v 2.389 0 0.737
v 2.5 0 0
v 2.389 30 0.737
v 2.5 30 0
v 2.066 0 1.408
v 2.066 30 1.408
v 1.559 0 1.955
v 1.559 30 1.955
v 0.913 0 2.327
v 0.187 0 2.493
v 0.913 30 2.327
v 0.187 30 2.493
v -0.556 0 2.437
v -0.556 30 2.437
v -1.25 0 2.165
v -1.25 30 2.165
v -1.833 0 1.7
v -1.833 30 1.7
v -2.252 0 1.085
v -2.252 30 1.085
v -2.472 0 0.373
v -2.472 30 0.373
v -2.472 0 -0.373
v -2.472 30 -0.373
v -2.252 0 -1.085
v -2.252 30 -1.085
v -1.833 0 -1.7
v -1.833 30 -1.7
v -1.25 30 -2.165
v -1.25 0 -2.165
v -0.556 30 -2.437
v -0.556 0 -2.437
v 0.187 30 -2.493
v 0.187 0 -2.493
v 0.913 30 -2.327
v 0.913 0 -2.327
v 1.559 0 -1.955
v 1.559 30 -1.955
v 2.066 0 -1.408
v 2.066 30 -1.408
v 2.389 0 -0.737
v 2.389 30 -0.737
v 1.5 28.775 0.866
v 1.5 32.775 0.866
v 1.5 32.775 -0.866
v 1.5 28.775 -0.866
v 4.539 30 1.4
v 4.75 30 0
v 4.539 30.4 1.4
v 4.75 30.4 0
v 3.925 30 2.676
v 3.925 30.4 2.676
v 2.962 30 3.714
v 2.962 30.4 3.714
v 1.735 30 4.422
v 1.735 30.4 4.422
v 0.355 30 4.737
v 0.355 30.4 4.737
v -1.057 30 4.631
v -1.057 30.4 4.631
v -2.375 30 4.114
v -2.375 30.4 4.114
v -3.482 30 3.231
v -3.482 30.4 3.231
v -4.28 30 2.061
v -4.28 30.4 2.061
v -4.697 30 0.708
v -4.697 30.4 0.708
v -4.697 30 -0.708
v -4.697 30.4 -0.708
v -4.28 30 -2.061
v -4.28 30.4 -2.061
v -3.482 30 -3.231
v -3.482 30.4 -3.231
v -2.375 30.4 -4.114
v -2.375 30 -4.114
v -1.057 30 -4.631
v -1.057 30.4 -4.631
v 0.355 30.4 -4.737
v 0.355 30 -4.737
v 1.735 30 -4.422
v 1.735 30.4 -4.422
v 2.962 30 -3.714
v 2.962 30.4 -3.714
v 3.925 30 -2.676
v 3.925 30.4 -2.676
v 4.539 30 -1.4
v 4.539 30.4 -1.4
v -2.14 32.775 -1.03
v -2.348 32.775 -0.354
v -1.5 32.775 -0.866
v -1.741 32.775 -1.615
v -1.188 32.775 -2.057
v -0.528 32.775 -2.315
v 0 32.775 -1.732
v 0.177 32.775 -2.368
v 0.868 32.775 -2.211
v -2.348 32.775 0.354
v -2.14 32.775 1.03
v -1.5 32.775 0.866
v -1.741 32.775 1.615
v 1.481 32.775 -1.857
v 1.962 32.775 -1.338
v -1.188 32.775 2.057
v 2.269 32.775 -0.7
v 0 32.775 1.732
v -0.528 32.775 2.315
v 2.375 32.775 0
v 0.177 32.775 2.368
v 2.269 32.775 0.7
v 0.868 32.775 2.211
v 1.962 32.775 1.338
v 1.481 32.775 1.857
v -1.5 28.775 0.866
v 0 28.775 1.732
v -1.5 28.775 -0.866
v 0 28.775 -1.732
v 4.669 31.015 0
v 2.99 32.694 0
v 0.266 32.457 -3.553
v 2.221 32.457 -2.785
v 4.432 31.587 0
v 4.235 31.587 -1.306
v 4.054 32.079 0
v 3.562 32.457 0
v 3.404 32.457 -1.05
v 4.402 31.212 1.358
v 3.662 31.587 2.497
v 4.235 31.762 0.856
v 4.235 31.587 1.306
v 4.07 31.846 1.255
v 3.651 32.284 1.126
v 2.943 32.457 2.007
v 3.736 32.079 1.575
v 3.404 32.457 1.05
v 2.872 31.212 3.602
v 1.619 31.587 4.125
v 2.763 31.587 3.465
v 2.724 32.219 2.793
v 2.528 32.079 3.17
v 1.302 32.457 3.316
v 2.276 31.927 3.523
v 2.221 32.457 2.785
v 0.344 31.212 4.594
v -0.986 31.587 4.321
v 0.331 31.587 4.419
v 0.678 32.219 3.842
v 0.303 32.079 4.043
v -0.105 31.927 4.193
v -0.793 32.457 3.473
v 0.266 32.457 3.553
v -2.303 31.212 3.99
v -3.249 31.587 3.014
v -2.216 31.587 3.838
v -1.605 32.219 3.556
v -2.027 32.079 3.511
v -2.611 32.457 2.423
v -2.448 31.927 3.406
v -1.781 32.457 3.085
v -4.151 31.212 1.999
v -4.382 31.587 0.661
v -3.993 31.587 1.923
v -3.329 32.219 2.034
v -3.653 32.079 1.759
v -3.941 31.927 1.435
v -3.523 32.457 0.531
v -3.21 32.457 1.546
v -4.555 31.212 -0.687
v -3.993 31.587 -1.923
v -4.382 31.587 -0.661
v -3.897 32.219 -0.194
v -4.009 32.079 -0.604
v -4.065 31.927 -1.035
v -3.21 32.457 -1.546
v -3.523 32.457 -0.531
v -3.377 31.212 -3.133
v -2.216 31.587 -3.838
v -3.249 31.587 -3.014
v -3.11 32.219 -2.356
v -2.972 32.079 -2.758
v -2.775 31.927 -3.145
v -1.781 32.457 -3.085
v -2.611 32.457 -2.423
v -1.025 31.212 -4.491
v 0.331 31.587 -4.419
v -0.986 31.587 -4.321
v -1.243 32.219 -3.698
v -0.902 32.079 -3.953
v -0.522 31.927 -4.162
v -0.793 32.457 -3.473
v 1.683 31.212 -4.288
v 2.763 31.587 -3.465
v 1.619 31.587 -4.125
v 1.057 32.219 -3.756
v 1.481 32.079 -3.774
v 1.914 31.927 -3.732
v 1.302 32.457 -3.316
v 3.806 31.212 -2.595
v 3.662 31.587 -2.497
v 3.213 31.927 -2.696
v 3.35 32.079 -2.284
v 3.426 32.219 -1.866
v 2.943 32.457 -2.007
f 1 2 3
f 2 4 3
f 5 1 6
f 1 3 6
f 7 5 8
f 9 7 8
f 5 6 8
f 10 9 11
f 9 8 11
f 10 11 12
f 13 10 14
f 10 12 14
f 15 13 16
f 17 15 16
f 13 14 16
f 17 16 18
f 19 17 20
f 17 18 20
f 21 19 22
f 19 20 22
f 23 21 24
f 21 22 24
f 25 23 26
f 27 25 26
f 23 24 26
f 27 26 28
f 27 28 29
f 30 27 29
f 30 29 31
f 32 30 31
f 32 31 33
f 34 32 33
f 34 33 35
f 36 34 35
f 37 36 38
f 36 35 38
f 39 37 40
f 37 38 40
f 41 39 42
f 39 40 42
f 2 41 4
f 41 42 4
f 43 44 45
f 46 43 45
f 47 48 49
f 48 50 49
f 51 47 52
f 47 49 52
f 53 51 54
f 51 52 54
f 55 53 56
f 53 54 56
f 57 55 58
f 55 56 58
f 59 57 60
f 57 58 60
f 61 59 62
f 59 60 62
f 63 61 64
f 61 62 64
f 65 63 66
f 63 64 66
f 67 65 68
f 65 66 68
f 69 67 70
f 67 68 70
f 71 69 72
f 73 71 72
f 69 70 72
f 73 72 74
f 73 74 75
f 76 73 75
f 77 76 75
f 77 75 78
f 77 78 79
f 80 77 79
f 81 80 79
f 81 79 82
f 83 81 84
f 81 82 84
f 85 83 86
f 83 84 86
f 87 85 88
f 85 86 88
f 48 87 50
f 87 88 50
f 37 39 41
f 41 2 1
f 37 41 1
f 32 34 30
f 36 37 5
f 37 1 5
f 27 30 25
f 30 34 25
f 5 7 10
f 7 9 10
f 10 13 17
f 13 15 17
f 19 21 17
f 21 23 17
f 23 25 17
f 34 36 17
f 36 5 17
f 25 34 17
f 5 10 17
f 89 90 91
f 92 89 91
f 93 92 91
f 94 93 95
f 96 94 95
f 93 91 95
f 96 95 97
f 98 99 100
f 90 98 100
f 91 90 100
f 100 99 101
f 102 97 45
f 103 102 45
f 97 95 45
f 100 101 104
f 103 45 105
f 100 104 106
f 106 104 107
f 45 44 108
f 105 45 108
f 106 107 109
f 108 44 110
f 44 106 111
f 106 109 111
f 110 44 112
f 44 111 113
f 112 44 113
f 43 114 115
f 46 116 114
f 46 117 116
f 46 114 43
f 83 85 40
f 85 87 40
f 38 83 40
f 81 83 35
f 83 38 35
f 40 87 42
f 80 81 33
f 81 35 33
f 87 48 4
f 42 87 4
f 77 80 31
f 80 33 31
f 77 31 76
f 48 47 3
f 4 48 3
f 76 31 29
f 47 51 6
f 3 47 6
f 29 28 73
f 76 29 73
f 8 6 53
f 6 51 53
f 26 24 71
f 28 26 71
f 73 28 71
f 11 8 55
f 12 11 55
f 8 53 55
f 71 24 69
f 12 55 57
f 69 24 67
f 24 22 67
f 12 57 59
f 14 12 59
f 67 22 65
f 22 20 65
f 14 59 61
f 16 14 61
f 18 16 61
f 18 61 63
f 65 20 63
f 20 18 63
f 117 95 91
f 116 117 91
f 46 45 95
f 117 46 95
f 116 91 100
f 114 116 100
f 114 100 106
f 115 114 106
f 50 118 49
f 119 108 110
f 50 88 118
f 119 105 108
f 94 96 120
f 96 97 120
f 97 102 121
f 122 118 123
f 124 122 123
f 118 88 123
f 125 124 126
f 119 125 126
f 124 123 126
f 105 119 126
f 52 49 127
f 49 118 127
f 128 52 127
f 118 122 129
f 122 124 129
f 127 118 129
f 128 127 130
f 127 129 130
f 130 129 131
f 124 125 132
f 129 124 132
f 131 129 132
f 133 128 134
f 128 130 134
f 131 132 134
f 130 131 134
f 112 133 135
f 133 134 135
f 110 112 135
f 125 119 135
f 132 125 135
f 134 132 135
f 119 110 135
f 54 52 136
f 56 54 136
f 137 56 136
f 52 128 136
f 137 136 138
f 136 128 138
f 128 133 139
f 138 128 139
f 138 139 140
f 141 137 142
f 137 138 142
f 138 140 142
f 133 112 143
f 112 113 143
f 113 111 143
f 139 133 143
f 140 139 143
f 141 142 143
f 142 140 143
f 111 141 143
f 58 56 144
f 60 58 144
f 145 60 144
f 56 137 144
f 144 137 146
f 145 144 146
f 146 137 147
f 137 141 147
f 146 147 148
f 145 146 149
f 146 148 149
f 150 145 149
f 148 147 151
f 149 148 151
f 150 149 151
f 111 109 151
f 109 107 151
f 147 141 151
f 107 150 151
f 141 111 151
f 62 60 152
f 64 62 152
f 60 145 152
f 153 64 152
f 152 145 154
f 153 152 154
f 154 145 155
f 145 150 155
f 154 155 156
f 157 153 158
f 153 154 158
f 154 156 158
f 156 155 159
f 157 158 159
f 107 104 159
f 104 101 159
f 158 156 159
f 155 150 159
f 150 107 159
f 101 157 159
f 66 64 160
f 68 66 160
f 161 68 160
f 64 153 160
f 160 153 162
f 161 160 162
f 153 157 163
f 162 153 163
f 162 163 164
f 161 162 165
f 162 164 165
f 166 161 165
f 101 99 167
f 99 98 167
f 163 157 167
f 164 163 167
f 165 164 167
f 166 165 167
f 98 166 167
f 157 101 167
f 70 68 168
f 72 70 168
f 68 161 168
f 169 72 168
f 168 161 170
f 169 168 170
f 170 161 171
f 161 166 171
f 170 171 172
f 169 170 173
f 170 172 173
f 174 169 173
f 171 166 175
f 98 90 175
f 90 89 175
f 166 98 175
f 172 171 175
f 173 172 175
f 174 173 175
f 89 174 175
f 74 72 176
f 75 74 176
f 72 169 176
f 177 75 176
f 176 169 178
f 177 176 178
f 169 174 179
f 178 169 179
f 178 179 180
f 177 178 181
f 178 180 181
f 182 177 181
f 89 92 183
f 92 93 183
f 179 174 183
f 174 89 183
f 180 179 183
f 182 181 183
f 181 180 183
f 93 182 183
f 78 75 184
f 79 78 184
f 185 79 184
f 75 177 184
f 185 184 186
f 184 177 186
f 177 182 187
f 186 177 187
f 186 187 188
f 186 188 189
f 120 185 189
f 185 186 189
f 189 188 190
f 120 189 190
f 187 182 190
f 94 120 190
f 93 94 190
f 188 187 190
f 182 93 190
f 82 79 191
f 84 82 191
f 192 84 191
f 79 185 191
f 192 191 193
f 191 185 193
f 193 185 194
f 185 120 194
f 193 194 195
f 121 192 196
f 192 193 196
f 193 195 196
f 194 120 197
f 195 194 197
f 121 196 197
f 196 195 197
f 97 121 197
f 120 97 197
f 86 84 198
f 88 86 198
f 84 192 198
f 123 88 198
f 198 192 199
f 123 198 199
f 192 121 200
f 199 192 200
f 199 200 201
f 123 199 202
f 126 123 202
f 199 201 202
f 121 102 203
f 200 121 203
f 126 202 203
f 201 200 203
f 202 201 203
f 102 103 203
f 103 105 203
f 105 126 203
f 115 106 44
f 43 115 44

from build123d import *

# Parameters (mm, degrees)
CORTE_EXTRUS_O1_DEPTH = 4


with BuildPart() as part:
    # Esboço1 → Revolução1 (revolve)
    with BuildSketch(Plane.XY):
        with BuildLine():
            Line((0, 0), (2.5, 0))
            Line((2.5, 0), (2.5, 30))
            Line((2.5, 30), (4.75, 30))
            Line((4.75, 30), (4.75, 30.4))
            ThreePointArc((4.75, 30.4), (4.054378605, 32.079378605), (2.375, 32.775))
            Line((2.375, 32.775), (0, 32.775))
            Line((0, 32.775), (0, 0))
        make_face()
    revolve(axis=Axis((0, 32.775, 0), (0, -1, 0)))

    # Esboço2 → Corte-extrusão1 (cut)
    with BuildSketch(Plane(origin=(0, 32.775, 0), x_dir=(1, 0, 0), z_dir=(0, 1, 0))):
        Polygon((-1.5, 0.866025404), (-1.5, -0.866025404), (0, -1.732050808), (1.5, -0.866025404), (1.5, 0.866025404), (0, 1.732050808), align=None)
    extrude(amount=-CORTE_EXTRUS_O1_DEPTH, mode=Mode.SUBTRACT)


solid = part.part
